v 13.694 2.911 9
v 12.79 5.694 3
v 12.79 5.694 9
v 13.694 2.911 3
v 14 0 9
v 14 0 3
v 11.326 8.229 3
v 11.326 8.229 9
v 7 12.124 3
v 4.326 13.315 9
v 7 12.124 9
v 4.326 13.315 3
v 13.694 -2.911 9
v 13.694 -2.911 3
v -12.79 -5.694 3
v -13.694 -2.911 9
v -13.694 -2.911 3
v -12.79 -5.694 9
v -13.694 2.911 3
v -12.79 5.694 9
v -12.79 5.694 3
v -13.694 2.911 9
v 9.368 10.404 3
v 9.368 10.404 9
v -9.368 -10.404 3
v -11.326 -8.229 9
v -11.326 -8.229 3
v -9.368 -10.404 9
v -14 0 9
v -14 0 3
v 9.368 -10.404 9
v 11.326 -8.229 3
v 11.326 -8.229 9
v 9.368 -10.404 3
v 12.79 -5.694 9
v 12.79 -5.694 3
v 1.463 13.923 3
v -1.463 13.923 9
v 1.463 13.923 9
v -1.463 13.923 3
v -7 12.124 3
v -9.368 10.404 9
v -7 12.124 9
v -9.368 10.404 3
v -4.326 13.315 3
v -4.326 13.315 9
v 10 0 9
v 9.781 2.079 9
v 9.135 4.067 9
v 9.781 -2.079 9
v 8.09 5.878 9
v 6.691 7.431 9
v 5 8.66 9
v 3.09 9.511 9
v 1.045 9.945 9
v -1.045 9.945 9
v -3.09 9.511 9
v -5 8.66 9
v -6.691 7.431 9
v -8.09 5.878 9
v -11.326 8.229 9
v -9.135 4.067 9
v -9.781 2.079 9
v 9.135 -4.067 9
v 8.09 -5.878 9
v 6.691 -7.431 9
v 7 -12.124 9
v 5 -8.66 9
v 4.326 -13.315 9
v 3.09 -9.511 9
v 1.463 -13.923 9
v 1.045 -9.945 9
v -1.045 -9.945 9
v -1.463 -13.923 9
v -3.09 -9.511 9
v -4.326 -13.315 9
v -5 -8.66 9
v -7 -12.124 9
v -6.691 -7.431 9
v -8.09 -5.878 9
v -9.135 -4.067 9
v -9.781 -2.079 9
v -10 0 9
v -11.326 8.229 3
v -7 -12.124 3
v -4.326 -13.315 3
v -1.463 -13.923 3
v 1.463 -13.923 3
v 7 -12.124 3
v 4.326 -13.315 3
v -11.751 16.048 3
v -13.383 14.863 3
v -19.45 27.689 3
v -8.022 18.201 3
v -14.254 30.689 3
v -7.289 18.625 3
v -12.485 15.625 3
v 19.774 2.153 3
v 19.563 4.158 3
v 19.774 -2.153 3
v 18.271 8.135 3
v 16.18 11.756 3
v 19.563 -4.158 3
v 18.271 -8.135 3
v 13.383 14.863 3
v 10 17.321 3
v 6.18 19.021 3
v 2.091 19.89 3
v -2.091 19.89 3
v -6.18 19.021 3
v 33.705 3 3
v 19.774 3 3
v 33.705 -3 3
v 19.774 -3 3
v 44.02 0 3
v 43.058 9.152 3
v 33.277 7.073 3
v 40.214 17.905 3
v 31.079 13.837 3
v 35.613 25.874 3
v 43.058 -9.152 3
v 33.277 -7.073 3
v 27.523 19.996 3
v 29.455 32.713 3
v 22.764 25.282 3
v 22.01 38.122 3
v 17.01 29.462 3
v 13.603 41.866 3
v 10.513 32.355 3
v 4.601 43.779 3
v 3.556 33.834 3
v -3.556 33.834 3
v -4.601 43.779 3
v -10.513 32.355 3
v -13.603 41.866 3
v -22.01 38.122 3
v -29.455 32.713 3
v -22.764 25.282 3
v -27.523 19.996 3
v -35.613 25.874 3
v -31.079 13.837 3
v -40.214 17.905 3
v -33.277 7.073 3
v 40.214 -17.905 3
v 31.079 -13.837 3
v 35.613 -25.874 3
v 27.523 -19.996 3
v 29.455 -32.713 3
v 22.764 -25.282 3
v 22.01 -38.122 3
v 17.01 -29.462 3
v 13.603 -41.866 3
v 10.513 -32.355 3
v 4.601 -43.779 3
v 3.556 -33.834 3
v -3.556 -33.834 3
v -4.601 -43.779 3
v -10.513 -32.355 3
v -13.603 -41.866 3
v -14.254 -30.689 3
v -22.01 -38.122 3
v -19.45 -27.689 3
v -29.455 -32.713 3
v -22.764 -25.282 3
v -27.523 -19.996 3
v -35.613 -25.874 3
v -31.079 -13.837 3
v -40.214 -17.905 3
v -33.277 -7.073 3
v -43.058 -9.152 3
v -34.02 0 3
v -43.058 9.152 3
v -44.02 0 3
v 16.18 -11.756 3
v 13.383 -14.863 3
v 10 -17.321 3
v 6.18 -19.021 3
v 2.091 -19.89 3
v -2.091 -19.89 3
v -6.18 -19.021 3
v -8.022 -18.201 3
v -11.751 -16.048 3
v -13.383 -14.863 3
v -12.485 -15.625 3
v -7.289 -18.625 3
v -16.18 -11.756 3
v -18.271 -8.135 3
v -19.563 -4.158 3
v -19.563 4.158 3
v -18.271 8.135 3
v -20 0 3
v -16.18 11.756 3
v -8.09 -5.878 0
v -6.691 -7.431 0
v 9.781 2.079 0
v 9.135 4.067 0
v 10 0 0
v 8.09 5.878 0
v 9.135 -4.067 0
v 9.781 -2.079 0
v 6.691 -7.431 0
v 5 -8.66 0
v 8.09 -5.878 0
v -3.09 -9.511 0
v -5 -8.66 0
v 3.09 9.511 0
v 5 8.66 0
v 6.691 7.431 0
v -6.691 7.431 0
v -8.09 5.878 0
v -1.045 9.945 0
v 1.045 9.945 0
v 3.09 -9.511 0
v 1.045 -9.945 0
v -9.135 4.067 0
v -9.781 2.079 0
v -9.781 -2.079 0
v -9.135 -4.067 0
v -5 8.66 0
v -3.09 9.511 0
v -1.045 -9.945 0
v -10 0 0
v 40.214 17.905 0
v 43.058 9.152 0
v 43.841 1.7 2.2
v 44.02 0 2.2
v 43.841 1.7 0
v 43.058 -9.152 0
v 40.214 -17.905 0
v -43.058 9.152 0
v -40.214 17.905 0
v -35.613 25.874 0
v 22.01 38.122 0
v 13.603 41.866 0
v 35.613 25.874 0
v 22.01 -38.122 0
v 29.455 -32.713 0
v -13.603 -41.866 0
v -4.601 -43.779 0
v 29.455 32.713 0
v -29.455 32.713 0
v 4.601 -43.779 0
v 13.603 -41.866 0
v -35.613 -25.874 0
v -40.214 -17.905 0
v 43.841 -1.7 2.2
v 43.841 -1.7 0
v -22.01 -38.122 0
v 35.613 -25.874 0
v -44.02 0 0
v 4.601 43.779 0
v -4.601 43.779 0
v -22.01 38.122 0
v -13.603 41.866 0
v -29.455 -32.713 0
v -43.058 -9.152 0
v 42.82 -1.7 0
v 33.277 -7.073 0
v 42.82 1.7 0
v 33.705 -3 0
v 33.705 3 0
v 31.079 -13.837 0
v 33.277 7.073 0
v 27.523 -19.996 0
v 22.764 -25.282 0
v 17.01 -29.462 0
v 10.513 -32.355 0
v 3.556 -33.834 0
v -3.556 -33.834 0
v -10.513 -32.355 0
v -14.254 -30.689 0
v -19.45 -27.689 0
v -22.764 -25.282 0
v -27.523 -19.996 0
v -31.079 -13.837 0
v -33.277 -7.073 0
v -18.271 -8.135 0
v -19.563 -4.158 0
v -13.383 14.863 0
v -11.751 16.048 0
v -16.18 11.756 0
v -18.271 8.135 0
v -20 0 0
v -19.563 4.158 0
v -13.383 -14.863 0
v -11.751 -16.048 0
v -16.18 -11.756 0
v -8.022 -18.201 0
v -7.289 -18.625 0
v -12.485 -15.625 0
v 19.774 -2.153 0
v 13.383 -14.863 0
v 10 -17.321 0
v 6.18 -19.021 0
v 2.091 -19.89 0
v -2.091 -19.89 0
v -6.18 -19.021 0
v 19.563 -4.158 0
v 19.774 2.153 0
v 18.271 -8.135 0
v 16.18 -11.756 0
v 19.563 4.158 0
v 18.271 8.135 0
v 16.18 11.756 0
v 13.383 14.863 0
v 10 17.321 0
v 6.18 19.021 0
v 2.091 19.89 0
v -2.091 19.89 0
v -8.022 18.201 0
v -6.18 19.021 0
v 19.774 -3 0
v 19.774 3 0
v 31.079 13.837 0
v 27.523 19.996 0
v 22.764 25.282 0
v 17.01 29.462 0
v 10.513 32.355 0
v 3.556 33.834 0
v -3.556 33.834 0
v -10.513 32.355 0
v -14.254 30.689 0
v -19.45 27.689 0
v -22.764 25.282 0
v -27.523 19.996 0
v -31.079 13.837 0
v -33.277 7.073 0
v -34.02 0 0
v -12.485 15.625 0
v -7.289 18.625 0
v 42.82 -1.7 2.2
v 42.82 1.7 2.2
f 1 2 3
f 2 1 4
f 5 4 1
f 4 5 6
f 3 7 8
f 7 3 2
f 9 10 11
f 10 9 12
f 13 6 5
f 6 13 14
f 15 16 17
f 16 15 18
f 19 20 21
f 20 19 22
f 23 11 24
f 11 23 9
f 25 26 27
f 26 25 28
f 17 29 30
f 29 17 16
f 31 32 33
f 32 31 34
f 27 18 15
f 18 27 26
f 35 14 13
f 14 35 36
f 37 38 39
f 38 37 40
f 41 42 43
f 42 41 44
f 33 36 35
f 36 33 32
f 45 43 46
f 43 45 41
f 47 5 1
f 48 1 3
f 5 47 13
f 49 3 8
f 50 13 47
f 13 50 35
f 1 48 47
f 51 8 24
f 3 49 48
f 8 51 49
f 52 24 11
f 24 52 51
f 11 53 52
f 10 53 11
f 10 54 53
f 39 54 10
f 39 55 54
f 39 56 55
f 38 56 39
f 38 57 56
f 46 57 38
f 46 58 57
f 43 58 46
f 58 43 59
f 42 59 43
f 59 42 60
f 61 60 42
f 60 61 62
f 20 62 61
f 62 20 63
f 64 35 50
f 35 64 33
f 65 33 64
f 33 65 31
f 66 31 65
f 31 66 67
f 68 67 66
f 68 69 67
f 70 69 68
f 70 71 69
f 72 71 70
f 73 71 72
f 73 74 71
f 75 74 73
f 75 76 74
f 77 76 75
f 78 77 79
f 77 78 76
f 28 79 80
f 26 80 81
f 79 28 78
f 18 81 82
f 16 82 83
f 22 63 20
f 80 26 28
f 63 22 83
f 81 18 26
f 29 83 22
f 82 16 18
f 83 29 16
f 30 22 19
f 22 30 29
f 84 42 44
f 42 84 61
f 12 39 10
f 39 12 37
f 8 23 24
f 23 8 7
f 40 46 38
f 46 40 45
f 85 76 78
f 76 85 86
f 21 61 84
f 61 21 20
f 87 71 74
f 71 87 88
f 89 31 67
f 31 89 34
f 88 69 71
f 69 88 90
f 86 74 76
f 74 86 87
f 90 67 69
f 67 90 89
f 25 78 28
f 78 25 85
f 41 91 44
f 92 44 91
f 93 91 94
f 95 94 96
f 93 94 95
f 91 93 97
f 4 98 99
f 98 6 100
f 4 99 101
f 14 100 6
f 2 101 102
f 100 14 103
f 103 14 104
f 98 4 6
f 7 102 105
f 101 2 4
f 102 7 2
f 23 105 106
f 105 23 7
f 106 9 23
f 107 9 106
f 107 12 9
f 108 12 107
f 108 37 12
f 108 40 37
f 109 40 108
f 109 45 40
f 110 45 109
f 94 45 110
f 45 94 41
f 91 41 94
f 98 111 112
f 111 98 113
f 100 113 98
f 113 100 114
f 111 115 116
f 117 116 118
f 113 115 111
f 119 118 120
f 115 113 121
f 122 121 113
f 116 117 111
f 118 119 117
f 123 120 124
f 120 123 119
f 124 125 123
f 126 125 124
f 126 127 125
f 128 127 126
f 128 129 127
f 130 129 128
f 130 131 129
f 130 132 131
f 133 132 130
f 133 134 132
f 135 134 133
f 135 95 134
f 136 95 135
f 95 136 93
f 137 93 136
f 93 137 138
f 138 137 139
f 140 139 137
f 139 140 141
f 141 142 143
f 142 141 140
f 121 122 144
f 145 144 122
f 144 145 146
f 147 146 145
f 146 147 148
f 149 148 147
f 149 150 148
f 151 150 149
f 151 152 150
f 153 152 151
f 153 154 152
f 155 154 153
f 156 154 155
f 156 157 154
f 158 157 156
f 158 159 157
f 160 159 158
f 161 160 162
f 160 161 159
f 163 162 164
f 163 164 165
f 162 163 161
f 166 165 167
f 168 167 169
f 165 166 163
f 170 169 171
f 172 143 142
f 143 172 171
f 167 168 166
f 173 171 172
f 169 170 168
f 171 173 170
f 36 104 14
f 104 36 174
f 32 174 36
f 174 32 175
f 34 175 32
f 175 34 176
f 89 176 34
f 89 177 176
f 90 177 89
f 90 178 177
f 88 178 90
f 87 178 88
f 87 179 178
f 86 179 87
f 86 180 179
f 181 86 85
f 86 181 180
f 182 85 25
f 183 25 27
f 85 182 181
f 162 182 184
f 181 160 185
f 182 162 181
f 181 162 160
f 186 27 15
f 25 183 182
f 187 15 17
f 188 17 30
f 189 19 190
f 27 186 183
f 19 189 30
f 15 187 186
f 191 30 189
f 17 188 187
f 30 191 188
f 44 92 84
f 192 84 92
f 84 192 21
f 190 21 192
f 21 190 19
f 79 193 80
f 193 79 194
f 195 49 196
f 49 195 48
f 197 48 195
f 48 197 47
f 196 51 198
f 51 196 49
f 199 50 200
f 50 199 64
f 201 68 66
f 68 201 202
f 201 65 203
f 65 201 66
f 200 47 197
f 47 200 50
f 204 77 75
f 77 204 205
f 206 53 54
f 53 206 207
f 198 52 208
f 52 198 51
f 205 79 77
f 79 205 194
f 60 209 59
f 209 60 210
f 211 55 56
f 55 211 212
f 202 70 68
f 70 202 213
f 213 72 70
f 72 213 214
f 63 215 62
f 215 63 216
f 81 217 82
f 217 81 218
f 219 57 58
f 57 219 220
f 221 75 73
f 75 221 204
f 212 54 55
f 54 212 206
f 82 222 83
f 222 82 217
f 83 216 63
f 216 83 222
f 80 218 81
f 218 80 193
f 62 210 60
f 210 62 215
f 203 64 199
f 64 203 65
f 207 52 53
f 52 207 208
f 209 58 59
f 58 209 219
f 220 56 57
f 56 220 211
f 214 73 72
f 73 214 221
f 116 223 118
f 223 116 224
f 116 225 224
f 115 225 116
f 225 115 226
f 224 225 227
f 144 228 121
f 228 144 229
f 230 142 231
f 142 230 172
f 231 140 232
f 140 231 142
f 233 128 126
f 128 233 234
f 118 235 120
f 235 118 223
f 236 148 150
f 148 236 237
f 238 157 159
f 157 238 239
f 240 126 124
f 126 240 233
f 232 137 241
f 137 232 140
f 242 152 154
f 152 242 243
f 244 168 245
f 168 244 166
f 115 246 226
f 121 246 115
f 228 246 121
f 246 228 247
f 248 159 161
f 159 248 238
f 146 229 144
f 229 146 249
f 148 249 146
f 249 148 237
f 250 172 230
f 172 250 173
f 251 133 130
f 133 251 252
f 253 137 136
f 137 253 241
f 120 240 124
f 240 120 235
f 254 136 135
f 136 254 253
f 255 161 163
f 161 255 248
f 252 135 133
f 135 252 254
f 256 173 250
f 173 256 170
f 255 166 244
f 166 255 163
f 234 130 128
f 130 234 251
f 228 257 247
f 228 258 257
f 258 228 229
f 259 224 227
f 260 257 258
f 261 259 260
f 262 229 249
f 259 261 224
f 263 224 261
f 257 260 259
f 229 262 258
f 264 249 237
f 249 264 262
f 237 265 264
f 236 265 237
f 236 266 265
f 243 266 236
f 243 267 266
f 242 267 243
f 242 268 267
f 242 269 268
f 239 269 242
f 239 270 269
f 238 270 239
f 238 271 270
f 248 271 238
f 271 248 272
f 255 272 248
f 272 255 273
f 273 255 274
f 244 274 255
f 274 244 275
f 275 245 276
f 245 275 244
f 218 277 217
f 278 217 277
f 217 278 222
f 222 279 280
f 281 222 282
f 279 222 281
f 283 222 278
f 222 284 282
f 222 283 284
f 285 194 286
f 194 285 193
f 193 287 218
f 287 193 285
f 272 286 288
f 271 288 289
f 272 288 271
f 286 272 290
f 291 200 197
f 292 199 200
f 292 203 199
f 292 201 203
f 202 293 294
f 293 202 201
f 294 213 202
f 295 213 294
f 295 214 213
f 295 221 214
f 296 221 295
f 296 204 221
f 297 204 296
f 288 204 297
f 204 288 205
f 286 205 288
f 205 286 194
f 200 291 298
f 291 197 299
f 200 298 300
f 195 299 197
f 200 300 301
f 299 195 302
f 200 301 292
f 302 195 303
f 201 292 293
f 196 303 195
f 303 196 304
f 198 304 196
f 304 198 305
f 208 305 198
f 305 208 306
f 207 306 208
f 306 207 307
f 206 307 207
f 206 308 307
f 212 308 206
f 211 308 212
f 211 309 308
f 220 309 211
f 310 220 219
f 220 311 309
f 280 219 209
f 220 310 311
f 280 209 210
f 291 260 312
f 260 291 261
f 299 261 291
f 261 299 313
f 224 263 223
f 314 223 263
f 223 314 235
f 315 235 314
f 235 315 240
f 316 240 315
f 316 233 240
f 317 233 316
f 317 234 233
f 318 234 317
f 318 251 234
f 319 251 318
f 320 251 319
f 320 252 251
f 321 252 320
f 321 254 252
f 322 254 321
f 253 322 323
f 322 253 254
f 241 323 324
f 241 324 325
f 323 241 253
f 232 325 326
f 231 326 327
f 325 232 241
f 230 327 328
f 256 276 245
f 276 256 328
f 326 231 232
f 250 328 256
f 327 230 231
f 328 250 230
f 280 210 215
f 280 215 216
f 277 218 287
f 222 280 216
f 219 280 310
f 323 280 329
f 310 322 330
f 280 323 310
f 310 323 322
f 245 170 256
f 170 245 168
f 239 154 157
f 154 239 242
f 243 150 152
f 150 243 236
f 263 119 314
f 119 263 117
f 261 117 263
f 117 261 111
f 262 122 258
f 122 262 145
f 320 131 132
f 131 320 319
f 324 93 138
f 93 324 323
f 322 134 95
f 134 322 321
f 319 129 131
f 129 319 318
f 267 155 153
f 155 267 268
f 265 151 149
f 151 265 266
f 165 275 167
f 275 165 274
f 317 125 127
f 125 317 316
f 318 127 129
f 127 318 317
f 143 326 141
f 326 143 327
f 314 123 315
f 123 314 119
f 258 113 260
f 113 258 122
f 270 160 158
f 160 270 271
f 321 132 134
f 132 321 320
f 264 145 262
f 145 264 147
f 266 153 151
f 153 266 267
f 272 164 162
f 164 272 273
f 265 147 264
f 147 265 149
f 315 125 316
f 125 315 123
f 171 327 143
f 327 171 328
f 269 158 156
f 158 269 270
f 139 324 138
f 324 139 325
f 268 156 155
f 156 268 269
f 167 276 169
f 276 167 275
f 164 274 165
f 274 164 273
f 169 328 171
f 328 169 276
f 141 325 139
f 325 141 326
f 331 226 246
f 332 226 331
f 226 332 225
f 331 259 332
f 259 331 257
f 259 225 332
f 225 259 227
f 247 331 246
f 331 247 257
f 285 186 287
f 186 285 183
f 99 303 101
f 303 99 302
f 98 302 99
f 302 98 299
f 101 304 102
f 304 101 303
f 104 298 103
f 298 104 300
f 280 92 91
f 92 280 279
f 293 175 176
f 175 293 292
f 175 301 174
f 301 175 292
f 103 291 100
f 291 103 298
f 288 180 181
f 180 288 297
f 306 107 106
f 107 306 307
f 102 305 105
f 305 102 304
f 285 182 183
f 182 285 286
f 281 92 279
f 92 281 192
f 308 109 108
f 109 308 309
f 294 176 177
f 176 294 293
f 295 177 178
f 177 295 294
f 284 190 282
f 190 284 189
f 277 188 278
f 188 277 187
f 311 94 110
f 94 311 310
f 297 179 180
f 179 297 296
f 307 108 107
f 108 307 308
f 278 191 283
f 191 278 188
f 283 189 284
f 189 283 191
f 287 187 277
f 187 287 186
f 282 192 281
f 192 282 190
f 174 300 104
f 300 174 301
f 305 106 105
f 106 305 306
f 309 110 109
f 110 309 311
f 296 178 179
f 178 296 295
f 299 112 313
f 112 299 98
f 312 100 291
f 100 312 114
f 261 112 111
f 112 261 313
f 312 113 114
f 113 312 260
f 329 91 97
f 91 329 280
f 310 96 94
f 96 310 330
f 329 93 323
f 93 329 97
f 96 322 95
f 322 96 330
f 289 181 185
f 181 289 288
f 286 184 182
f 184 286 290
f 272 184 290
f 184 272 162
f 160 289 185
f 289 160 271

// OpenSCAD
// ===================== PARAMETERS =====================
od        = 3.6 * 25.4;          // outer diameter of mating shell (91.44 mm) - matches middle connector
wall      = 1.5;                 // shell wall thickness
ledge_w   = 2;                   // connector inner-ledge radial width (the shelf the disc rests on)
fit_clr   = 0.4;                 // diametral slip-fit clearance for disc inside the top ring
disc_d    = od - 2*wall - fit_clr;  // disc OD = 88.04 mm - drops through bore (88.44) and rests on ledge (opening 84.44)
disc_h    = 3;
center_d  = 20;                  // center bore diameter
post_d    = 28;                  // upper post outer diameter
post_h    = 6;
ring_w    = 10;                  // outer ring width
n_spokes  = 3;                   // number of spokes
spoke_w   = 6;                   // spoke width (tangential)

// alignment key notch (matches middle connector key: key_w=3, key_h=2, key_depth=1)
key_w       = 3;     // tangential width
key_h       = 2;     // height (Z)
key_depth   = 1;     // radial depth
key_clr     = 0.2;   // clearance around key
// ======================================================

// upper post
translate([0,0,disc_h]) {
    difference() {
        cylinder(h=post_h, d=post_d);
        cylinder(h=post_h, d=center_d);
    }
}

// lower platform: outer ring + inner hub + spokes
translate([0,0,0]) {
    // outer ring with key notch
    difference() {
        cylinder(h=disc_h, d=disc_d);
        cylinder(h=disc_h, d=disc_d - 2*ring_w);
        // key notch (cut from bottom so mount rests over the connector's key)
        translate([disc_d/2 - key_depth - key_clr,
                   -(key_w + 2*key_clr)/2,
                   -1])
            cube([key_depth + key_clr + 1,
                  key_w + 2*key_clr,
                  key_h + key_clr + 1]);
    }

    // inner hub (solid to 20mm radius)
    difference() {
        cylinder(h=disc_h, d=40);
        cylinder(h=disc_h, d=center_d);
    }

    // spokes (start inward to fully connect to curved hub)
    spoke_r_start = sqrt(20*20 - (spoke_w/2)*(spoke_w/2));
    for(i = [0 : n_spokes-1]) {
        rotate([0, 0, i * 360/n_spokes])
            translate([spoke_r_start, -spoke_w/2, 0])
                cube([disc_d/2 - ring_w - spoke_r_start, spoke_w, disc_h]);
    }
}
